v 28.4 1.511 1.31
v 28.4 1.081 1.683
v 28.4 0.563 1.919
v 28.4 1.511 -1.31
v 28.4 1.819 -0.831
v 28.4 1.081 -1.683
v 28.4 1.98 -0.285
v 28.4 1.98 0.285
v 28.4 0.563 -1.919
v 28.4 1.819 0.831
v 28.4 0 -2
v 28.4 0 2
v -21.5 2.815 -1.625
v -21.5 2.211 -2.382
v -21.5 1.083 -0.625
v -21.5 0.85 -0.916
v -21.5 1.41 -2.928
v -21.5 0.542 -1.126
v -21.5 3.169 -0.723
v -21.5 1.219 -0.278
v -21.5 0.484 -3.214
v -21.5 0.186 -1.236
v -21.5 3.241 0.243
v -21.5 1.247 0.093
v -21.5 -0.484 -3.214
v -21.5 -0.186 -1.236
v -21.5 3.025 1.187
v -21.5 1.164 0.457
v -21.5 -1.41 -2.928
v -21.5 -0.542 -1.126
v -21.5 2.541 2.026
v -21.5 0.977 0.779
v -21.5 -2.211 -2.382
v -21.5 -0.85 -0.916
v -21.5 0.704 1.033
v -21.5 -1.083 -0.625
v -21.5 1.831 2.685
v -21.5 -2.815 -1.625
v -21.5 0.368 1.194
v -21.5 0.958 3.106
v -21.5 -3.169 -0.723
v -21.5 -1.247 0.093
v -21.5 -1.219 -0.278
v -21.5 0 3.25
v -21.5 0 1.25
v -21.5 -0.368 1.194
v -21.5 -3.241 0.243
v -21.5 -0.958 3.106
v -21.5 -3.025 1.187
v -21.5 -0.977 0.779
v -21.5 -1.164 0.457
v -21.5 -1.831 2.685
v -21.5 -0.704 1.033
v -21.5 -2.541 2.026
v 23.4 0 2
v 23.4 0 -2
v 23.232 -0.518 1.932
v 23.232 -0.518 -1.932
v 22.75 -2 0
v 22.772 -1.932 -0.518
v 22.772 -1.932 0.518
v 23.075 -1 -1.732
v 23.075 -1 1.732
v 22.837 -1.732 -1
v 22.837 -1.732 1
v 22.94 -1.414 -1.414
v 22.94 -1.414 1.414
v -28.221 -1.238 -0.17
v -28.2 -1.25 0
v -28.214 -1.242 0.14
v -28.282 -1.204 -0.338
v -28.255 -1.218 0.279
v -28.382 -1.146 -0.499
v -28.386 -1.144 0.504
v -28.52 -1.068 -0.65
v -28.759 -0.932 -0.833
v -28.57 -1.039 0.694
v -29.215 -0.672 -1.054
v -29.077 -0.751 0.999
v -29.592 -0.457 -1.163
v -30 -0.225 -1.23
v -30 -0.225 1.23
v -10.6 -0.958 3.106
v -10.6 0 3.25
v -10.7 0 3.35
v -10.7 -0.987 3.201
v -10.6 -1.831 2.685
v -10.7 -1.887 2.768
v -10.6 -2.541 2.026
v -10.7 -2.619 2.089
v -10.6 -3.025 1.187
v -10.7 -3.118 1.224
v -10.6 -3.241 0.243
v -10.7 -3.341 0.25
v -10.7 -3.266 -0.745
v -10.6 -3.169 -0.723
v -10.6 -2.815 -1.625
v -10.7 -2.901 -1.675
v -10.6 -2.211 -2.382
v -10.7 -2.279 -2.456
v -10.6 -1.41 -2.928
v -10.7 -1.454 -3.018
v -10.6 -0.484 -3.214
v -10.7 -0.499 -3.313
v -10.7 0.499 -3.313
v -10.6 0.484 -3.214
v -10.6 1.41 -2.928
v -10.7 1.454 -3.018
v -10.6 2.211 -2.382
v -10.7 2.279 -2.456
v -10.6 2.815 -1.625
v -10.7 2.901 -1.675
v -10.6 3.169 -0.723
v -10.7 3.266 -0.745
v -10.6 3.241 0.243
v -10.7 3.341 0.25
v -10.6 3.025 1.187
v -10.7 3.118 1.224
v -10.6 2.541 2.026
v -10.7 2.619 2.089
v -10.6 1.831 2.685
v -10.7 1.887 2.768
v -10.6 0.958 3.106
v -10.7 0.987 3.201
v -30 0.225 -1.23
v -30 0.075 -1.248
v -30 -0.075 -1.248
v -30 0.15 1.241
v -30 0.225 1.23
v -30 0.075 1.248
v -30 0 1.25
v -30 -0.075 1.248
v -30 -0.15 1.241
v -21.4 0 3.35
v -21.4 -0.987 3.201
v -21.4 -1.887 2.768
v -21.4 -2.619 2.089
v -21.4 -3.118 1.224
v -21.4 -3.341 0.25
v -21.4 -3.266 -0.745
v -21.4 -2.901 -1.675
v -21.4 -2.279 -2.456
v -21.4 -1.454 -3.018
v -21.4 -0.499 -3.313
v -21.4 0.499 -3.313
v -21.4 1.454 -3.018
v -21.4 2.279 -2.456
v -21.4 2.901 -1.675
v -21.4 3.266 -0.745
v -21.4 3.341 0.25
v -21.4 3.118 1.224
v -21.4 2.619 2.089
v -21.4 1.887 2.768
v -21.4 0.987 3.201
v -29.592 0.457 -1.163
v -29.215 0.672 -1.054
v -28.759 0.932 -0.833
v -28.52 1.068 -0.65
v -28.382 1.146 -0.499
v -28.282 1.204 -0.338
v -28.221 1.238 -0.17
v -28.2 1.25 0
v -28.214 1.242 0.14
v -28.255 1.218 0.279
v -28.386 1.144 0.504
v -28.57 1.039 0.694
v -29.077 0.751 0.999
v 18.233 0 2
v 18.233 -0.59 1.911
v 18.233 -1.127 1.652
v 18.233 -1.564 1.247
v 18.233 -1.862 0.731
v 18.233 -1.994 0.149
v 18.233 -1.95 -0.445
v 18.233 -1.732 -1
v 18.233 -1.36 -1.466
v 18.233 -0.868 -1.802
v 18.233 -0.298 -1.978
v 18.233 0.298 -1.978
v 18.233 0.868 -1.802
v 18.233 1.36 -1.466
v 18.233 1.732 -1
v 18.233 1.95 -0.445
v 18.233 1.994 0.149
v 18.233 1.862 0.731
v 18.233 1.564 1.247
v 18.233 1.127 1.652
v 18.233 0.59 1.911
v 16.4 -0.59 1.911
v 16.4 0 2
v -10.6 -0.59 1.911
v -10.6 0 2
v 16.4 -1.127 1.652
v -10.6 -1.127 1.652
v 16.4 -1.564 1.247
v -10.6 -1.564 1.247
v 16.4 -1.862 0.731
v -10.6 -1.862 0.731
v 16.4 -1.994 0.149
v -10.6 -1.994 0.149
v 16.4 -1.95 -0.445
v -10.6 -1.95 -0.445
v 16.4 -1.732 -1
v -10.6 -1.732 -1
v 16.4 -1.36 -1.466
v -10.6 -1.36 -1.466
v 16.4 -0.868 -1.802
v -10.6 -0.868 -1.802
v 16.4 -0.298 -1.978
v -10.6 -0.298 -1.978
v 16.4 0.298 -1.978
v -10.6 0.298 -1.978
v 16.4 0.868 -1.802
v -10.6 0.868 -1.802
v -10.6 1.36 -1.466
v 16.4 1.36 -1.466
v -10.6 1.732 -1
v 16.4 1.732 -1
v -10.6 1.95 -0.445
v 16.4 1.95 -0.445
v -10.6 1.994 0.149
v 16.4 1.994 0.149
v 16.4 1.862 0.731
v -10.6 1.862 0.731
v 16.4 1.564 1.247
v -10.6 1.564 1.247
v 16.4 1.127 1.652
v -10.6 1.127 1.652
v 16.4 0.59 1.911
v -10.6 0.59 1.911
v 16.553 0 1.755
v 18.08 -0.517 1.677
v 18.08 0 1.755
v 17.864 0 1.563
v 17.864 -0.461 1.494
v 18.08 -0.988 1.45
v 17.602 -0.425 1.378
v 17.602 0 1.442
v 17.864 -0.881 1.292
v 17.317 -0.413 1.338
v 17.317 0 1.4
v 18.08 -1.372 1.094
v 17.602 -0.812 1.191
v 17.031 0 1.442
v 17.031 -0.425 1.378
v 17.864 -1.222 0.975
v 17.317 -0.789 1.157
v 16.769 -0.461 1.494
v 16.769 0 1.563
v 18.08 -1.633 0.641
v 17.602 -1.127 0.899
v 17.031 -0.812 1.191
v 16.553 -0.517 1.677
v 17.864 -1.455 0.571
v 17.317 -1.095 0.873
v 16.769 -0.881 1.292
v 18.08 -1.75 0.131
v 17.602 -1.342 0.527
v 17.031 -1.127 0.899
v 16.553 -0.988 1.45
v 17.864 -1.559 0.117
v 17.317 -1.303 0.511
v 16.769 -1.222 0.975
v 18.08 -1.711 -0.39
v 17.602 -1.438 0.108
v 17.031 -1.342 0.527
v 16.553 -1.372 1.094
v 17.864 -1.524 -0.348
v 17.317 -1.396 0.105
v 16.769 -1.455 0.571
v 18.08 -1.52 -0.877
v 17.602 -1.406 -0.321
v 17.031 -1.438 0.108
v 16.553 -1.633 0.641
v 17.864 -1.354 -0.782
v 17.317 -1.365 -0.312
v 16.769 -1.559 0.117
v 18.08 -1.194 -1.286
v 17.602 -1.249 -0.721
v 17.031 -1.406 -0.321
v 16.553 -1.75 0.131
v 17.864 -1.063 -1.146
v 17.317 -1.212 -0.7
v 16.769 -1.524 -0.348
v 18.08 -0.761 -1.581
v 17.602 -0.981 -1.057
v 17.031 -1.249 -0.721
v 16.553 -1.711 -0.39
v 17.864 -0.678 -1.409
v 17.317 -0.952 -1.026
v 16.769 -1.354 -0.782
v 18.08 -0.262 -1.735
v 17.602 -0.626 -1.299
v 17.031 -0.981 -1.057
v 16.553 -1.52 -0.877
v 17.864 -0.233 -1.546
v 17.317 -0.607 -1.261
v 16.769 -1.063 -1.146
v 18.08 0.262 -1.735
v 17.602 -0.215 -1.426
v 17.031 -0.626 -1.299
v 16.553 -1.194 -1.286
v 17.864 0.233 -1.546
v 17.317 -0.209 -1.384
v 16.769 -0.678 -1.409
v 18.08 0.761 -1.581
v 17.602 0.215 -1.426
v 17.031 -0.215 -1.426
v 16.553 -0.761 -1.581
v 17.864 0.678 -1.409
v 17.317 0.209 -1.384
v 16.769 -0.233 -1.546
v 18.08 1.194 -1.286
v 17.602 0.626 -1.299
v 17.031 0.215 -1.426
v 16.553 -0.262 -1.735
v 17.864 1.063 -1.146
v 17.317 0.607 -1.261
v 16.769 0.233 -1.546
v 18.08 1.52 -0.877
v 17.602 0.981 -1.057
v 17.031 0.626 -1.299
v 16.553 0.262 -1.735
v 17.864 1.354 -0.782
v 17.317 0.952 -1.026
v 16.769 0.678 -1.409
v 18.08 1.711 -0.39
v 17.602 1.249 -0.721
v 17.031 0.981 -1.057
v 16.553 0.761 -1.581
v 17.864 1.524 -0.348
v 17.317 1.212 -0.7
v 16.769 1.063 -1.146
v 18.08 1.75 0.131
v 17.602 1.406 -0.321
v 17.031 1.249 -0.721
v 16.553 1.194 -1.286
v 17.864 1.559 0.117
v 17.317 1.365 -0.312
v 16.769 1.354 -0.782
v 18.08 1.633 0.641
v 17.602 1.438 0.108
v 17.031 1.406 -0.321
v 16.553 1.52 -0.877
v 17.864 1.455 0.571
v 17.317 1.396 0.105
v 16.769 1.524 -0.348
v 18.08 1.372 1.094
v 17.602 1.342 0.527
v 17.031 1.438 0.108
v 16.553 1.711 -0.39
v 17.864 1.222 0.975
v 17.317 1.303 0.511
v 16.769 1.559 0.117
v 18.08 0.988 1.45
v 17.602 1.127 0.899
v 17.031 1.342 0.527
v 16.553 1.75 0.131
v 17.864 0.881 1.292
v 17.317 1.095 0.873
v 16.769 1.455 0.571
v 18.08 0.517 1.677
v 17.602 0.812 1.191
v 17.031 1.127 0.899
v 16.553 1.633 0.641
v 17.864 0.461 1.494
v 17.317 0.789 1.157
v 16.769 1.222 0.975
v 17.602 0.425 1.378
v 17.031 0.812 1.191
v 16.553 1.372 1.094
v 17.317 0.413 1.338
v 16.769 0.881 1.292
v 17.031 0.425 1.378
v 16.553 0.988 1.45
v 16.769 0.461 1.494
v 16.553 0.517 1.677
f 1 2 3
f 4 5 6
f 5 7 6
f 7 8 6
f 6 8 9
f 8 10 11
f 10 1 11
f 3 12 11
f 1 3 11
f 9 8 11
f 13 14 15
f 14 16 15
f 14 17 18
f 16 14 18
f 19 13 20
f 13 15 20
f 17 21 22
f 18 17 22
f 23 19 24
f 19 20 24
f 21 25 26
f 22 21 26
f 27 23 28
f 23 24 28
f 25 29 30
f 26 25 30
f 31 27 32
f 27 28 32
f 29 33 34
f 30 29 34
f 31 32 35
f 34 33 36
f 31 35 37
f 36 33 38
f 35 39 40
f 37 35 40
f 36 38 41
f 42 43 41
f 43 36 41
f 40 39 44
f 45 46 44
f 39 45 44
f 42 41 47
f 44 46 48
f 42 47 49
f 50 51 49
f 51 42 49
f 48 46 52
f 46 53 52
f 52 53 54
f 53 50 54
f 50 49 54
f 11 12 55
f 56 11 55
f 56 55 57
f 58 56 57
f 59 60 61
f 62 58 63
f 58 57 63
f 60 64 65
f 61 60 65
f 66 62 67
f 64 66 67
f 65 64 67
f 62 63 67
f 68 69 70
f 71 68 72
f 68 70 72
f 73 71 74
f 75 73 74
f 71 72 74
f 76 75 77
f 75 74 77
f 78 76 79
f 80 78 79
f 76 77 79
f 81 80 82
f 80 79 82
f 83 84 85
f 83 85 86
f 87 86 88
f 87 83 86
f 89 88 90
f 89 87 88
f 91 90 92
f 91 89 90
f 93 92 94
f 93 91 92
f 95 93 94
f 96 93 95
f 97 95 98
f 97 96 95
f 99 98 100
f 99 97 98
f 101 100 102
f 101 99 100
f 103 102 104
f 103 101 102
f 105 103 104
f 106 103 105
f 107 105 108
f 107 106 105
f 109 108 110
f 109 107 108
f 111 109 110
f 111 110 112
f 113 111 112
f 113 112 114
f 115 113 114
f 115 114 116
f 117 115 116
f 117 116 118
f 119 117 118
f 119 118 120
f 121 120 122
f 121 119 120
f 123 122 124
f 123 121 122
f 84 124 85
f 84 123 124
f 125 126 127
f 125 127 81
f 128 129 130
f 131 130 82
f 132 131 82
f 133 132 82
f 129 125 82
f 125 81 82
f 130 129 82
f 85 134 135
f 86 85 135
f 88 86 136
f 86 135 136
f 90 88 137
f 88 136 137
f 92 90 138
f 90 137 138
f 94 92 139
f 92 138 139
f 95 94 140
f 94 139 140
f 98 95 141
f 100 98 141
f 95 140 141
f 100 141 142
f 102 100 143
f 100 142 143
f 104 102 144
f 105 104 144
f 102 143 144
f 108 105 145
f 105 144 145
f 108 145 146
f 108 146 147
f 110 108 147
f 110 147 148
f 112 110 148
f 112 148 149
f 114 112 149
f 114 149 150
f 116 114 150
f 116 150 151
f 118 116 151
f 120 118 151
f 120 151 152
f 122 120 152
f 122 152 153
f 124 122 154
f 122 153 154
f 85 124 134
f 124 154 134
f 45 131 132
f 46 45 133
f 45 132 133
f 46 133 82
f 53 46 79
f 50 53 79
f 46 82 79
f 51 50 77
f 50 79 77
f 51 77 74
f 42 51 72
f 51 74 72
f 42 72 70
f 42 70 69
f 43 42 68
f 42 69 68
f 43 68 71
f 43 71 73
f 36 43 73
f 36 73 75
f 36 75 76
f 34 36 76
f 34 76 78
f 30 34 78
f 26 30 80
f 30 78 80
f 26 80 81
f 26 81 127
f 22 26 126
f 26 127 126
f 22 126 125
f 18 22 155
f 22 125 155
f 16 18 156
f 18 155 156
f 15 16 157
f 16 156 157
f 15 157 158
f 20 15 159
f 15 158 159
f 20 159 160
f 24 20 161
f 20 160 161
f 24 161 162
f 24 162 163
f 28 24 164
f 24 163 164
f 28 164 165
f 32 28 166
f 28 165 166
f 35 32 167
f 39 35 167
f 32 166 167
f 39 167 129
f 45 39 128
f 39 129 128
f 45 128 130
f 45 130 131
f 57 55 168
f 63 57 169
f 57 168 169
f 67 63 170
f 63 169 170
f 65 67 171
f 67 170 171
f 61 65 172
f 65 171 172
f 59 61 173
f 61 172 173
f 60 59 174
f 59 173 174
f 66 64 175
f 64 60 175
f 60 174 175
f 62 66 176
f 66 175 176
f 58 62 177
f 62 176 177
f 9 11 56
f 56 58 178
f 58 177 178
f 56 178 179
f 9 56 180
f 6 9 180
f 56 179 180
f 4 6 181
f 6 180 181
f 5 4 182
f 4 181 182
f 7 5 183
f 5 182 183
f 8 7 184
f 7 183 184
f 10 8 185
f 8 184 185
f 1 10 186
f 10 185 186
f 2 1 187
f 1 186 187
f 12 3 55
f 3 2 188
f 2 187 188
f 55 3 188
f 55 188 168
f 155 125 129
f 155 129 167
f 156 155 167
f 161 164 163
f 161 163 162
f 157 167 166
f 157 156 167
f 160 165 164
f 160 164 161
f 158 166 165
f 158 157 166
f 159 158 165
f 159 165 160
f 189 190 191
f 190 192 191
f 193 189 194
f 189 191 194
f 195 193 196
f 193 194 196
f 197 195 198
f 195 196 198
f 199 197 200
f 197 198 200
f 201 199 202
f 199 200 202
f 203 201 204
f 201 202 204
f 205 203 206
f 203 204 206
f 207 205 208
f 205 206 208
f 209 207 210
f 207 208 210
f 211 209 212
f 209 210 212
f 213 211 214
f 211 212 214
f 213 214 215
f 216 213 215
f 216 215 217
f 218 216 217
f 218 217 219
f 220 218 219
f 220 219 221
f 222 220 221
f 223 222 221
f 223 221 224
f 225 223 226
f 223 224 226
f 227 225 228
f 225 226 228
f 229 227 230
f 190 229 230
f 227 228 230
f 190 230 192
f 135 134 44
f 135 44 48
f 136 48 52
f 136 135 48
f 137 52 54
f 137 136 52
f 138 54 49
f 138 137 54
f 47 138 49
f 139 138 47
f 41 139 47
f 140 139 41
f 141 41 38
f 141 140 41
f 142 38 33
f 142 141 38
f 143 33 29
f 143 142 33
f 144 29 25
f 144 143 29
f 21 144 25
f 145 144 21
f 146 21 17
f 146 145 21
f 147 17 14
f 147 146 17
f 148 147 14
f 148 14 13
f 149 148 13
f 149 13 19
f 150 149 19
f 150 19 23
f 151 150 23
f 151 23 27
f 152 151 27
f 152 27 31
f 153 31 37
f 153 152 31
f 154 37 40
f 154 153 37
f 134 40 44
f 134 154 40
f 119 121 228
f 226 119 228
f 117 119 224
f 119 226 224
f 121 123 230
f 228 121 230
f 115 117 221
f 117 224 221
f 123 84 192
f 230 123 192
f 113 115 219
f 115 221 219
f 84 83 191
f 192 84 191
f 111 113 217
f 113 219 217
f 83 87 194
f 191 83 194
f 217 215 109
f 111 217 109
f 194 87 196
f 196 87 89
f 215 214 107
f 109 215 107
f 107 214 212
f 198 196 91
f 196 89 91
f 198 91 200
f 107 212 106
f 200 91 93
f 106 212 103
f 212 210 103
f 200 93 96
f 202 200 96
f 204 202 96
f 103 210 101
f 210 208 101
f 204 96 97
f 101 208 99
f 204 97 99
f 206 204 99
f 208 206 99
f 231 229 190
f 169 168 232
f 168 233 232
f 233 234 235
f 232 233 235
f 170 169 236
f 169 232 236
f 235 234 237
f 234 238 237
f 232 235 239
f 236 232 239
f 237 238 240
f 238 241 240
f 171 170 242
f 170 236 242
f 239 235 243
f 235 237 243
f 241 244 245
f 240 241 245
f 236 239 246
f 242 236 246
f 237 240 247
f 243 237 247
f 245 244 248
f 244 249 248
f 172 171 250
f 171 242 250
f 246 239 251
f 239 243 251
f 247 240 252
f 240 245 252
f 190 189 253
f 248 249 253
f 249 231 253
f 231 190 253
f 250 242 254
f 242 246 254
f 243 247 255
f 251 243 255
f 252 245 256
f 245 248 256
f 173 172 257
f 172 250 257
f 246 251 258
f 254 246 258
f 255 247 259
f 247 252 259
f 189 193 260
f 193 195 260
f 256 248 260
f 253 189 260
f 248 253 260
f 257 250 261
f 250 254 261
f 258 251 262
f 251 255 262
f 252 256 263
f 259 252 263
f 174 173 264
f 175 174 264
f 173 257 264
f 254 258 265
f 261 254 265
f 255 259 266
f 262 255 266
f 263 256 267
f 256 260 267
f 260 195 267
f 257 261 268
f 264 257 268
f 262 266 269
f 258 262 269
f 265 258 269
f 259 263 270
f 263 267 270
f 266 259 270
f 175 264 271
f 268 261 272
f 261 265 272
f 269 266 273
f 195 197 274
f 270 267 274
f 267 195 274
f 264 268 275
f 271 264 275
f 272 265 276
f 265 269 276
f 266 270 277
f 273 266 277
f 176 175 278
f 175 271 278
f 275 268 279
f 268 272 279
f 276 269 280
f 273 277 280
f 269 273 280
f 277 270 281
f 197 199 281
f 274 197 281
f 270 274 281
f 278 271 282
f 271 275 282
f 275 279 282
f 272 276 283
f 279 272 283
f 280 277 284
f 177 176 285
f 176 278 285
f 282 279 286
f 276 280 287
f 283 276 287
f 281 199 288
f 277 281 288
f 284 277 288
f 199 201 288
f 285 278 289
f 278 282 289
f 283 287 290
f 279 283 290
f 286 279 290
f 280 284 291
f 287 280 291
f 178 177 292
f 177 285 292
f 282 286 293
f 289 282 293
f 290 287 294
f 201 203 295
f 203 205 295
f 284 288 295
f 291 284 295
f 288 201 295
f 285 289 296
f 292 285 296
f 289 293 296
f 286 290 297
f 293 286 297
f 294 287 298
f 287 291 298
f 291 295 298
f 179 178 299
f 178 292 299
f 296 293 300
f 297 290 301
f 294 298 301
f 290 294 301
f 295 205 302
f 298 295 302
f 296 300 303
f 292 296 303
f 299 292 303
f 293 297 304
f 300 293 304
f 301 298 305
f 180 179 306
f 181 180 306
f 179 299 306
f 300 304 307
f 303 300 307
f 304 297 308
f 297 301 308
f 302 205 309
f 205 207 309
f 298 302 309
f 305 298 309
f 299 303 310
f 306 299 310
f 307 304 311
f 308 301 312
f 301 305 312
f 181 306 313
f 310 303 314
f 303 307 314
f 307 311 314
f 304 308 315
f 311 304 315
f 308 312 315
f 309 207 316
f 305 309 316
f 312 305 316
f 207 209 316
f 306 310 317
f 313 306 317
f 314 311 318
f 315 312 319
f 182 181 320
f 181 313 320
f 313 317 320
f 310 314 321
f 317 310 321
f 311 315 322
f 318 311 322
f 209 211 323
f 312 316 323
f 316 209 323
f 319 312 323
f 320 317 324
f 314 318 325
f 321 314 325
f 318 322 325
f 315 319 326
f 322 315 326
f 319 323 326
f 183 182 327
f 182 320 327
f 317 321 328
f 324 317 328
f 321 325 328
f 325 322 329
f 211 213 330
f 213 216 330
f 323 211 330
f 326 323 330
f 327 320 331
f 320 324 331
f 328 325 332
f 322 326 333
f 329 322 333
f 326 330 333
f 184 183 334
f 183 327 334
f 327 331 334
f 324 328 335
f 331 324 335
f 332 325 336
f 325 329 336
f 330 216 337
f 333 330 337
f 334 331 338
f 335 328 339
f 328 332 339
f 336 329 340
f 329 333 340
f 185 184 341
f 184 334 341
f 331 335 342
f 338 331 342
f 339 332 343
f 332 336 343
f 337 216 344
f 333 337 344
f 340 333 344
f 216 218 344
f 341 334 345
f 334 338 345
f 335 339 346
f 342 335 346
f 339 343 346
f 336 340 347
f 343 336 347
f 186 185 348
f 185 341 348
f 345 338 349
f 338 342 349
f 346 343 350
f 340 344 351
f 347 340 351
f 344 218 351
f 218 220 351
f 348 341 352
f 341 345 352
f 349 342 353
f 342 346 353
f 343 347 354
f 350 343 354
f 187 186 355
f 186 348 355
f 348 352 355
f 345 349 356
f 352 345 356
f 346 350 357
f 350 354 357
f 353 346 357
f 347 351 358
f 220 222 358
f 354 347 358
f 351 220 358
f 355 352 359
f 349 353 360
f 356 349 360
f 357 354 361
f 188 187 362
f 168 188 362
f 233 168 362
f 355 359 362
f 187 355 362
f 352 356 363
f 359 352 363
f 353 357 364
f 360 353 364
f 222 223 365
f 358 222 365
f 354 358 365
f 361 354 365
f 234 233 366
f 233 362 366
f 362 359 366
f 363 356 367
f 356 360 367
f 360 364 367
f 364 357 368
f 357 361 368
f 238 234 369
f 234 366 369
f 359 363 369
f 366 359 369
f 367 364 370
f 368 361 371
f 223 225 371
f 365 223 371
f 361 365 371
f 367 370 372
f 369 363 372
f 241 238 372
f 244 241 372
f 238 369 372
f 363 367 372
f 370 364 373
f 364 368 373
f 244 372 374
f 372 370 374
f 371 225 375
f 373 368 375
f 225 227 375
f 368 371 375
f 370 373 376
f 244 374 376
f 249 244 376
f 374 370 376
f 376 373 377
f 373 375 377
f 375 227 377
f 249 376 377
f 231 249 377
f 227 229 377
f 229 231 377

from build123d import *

# Parameters (mm, degrees)
F3_DEPTH = 12.5
F5_DEPTH = 12.5
F6_SIZE  = 0.1


with BuildPart() as f1:
    # F0 (on Front) → F1 (revolve)
    with BuildSketch(Plane.XZ):
        with BuildLine():
            Line((-30, 1.25), (-30, 0))
            Line((-30, 0), (28.4, 0))
            Line((28.4, 0), (28.4, 2))
            Line((28.4, 2), (18.23303, 2))
            ThreePointArc((18.23303, 2), (17.316515, 1.4), (16.4, 2))
            Line((16.4, 2), (-10.6, 2))
            Line((-10.6, 2), (-10.6, 3.35))
            Line((-10.6, 3.35), (-21.5, 3.35))
            Line((-21.5, 3.35), (-21.5, 1.25))
            Line((-21.5, 1.25), (-30, 1.25))
        make_face()
    revolve(axis=Axis((0, 0, 0), (1, 0, 0)))

    # F2 (on Top) → F3 (cut, symmetric)
    with BuildSketch(Plane.XY):
        Polygon((28.4, -2), (28.4, 0), (23.4, 0), (22.750161, -2), align=None)
    extrude(amount=F3_DEPTH, both=True, mode=Mode.SUBTRACT)

    # F4 (on Top) → F5 (cut, symmetric)
    with BuildSketch(Plane.XY):
        Polygon((-30, 1.25), (-30, 0.225), (-28.2, 1.25), align=None)
        Polygon((-28.2, -1.25), (-30, -0.225), (-30, -1.25), align=None)
    extrude(amount=F5_DEPTH, both=True, mode=Mode.SUBTRACT)

    # F6
    f6_edges = [f1.edges().sort_by_distance(p)[0] for p in [
        (-10.6, 0, -3.35),
        (-21.5, 0, -3.35),
    ]]
    chamfer(f6_edges, length=F6_SIZE)


solid = f1.part
